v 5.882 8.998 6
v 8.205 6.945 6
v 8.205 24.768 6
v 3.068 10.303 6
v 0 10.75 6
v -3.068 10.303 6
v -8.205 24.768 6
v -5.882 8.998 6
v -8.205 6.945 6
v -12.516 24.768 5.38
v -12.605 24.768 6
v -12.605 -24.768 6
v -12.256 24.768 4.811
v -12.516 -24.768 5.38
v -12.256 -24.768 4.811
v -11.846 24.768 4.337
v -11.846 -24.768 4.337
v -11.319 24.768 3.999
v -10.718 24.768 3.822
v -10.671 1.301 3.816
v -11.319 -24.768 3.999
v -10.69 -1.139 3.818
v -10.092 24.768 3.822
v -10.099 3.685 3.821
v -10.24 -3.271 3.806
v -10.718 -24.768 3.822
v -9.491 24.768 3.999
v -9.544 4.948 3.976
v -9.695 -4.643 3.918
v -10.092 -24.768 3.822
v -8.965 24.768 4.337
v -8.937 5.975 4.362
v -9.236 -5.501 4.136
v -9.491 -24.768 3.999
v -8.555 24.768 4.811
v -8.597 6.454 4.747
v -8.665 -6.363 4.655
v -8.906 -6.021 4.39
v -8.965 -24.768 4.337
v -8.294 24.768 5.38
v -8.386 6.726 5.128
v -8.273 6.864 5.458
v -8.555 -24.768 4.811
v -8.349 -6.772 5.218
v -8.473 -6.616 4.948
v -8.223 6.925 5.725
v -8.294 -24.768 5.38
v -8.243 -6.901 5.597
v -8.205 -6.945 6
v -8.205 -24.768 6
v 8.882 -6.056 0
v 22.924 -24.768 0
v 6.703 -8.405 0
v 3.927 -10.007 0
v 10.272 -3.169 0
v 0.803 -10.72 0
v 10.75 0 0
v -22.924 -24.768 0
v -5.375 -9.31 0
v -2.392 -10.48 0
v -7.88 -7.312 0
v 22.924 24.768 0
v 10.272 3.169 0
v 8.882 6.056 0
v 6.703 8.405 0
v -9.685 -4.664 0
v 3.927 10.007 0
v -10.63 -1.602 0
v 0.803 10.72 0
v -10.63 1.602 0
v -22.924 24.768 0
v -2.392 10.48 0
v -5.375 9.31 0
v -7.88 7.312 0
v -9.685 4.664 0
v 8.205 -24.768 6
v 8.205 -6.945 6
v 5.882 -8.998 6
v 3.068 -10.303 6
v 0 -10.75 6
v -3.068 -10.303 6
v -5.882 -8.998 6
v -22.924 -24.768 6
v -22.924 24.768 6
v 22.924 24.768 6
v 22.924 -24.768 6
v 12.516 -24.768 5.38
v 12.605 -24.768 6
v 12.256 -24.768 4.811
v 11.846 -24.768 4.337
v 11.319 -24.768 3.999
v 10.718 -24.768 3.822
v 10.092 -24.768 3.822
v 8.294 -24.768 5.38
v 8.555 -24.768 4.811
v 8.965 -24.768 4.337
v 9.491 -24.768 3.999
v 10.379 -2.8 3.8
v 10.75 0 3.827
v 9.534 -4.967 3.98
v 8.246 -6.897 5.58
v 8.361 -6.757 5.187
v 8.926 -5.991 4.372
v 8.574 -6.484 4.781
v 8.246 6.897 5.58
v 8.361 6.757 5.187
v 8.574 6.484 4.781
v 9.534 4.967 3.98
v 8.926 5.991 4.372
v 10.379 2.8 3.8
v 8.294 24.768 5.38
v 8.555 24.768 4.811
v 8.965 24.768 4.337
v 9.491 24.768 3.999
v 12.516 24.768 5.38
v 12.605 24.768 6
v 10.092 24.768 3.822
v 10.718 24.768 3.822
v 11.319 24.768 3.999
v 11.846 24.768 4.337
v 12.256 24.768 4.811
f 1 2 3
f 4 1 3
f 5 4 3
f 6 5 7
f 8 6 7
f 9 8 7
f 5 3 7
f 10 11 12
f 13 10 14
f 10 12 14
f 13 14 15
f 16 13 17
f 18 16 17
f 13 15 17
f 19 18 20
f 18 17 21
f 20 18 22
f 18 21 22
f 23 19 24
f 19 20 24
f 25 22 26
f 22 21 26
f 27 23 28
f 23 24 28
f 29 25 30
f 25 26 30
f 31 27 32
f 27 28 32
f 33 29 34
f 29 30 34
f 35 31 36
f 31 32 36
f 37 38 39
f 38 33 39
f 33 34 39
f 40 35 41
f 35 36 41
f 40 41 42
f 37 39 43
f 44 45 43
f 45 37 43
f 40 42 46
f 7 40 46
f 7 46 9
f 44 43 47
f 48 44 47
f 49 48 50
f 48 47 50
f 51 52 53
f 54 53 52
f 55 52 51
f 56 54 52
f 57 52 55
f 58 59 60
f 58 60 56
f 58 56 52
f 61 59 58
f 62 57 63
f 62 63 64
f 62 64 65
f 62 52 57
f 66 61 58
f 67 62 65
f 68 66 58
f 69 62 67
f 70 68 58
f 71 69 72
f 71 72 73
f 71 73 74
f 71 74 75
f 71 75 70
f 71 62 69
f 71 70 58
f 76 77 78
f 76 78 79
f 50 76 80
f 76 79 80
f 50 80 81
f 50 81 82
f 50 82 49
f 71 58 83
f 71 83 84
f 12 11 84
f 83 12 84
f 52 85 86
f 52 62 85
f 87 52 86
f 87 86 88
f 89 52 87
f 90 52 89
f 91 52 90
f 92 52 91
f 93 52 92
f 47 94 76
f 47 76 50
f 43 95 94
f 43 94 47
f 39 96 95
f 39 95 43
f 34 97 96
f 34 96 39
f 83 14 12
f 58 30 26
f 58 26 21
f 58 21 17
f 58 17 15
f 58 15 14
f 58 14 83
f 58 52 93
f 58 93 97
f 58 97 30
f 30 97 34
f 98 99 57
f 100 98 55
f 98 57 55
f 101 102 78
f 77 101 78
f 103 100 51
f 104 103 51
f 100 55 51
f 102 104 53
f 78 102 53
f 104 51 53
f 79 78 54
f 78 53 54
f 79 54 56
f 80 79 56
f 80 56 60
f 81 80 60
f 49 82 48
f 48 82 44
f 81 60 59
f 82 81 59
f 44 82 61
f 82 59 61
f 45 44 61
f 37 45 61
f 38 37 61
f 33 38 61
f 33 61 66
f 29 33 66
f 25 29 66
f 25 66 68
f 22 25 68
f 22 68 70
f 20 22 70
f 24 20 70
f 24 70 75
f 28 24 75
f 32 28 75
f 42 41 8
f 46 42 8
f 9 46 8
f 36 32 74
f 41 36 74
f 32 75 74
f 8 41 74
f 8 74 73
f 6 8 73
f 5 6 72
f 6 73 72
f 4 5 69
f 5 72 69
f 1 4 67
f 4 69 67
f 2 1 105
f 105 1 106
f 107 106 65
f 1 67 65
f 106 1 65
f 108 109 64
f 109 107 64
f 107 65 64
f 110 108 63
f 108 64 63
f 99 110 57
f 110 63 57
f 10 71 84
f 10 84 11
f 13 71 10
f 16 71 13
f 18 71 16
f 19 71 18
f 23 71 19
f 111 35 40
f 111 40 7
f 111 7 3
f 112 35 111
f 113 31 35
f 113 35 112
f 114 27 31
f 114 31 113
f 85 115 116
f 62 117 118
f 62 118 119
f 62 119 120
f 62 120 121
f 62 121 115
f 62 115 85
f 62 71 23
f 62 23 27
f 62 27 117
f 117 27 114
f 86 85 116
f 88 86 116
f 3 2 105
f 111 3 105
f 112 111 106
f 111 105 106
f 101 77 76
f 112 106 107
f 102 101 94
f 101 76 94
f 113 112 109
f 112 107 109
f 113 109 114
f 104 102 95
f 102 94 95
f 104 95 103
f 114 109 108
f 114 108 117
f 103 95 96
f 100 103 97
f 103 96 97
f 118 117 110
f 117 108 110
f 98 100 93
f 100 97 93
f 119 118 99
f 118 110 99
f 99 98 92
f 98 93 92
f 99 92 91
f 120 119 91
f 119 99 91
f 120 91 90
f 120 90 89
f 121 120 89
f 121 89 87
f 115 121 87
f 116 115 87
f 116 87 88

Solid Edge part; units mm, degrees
sketch "Sketch1" plane through (0, 0, 0) normal (0, 0, 1) x (1, 0, 0)
  circle A0 centre (0, 0) radius 10.75
  line L0 (-22.9244, 24.7679) -> (22.9244, 24.7679)
  line L1 (22.9244, 24.7679) -> (22.9244, -24.7679)
  line L2 (22.9244, -24.7679) -> (-22.9244, -24.7679)
  line L3 (-22.9244, -24.7679) -> (-22.9244, 24.7679)
  dimension "D1" = 21.5
extrude "Protrusion1" add sketch "Sketch1" along normal blind 6
sketch "Sketch2" plane through (0, -24.7679, 3) normal (0, -1, 0) x (1, 0, 0)
  line L0 (-8.2053, 3) -> (-12.6053, 3)
  arc A0 (-8.2053, 3) -> (-12.6053, 3) centre (-10.4053, 3) cw
  line L1 (12.6053, 3) -> (8.2053, 3)
  arc A1 (12.6053, 3) -> (8.2053, 3) centre (10.4053, 3) cw
extrude "Cutout1" cut sketch "Sketch2" against normal through all
